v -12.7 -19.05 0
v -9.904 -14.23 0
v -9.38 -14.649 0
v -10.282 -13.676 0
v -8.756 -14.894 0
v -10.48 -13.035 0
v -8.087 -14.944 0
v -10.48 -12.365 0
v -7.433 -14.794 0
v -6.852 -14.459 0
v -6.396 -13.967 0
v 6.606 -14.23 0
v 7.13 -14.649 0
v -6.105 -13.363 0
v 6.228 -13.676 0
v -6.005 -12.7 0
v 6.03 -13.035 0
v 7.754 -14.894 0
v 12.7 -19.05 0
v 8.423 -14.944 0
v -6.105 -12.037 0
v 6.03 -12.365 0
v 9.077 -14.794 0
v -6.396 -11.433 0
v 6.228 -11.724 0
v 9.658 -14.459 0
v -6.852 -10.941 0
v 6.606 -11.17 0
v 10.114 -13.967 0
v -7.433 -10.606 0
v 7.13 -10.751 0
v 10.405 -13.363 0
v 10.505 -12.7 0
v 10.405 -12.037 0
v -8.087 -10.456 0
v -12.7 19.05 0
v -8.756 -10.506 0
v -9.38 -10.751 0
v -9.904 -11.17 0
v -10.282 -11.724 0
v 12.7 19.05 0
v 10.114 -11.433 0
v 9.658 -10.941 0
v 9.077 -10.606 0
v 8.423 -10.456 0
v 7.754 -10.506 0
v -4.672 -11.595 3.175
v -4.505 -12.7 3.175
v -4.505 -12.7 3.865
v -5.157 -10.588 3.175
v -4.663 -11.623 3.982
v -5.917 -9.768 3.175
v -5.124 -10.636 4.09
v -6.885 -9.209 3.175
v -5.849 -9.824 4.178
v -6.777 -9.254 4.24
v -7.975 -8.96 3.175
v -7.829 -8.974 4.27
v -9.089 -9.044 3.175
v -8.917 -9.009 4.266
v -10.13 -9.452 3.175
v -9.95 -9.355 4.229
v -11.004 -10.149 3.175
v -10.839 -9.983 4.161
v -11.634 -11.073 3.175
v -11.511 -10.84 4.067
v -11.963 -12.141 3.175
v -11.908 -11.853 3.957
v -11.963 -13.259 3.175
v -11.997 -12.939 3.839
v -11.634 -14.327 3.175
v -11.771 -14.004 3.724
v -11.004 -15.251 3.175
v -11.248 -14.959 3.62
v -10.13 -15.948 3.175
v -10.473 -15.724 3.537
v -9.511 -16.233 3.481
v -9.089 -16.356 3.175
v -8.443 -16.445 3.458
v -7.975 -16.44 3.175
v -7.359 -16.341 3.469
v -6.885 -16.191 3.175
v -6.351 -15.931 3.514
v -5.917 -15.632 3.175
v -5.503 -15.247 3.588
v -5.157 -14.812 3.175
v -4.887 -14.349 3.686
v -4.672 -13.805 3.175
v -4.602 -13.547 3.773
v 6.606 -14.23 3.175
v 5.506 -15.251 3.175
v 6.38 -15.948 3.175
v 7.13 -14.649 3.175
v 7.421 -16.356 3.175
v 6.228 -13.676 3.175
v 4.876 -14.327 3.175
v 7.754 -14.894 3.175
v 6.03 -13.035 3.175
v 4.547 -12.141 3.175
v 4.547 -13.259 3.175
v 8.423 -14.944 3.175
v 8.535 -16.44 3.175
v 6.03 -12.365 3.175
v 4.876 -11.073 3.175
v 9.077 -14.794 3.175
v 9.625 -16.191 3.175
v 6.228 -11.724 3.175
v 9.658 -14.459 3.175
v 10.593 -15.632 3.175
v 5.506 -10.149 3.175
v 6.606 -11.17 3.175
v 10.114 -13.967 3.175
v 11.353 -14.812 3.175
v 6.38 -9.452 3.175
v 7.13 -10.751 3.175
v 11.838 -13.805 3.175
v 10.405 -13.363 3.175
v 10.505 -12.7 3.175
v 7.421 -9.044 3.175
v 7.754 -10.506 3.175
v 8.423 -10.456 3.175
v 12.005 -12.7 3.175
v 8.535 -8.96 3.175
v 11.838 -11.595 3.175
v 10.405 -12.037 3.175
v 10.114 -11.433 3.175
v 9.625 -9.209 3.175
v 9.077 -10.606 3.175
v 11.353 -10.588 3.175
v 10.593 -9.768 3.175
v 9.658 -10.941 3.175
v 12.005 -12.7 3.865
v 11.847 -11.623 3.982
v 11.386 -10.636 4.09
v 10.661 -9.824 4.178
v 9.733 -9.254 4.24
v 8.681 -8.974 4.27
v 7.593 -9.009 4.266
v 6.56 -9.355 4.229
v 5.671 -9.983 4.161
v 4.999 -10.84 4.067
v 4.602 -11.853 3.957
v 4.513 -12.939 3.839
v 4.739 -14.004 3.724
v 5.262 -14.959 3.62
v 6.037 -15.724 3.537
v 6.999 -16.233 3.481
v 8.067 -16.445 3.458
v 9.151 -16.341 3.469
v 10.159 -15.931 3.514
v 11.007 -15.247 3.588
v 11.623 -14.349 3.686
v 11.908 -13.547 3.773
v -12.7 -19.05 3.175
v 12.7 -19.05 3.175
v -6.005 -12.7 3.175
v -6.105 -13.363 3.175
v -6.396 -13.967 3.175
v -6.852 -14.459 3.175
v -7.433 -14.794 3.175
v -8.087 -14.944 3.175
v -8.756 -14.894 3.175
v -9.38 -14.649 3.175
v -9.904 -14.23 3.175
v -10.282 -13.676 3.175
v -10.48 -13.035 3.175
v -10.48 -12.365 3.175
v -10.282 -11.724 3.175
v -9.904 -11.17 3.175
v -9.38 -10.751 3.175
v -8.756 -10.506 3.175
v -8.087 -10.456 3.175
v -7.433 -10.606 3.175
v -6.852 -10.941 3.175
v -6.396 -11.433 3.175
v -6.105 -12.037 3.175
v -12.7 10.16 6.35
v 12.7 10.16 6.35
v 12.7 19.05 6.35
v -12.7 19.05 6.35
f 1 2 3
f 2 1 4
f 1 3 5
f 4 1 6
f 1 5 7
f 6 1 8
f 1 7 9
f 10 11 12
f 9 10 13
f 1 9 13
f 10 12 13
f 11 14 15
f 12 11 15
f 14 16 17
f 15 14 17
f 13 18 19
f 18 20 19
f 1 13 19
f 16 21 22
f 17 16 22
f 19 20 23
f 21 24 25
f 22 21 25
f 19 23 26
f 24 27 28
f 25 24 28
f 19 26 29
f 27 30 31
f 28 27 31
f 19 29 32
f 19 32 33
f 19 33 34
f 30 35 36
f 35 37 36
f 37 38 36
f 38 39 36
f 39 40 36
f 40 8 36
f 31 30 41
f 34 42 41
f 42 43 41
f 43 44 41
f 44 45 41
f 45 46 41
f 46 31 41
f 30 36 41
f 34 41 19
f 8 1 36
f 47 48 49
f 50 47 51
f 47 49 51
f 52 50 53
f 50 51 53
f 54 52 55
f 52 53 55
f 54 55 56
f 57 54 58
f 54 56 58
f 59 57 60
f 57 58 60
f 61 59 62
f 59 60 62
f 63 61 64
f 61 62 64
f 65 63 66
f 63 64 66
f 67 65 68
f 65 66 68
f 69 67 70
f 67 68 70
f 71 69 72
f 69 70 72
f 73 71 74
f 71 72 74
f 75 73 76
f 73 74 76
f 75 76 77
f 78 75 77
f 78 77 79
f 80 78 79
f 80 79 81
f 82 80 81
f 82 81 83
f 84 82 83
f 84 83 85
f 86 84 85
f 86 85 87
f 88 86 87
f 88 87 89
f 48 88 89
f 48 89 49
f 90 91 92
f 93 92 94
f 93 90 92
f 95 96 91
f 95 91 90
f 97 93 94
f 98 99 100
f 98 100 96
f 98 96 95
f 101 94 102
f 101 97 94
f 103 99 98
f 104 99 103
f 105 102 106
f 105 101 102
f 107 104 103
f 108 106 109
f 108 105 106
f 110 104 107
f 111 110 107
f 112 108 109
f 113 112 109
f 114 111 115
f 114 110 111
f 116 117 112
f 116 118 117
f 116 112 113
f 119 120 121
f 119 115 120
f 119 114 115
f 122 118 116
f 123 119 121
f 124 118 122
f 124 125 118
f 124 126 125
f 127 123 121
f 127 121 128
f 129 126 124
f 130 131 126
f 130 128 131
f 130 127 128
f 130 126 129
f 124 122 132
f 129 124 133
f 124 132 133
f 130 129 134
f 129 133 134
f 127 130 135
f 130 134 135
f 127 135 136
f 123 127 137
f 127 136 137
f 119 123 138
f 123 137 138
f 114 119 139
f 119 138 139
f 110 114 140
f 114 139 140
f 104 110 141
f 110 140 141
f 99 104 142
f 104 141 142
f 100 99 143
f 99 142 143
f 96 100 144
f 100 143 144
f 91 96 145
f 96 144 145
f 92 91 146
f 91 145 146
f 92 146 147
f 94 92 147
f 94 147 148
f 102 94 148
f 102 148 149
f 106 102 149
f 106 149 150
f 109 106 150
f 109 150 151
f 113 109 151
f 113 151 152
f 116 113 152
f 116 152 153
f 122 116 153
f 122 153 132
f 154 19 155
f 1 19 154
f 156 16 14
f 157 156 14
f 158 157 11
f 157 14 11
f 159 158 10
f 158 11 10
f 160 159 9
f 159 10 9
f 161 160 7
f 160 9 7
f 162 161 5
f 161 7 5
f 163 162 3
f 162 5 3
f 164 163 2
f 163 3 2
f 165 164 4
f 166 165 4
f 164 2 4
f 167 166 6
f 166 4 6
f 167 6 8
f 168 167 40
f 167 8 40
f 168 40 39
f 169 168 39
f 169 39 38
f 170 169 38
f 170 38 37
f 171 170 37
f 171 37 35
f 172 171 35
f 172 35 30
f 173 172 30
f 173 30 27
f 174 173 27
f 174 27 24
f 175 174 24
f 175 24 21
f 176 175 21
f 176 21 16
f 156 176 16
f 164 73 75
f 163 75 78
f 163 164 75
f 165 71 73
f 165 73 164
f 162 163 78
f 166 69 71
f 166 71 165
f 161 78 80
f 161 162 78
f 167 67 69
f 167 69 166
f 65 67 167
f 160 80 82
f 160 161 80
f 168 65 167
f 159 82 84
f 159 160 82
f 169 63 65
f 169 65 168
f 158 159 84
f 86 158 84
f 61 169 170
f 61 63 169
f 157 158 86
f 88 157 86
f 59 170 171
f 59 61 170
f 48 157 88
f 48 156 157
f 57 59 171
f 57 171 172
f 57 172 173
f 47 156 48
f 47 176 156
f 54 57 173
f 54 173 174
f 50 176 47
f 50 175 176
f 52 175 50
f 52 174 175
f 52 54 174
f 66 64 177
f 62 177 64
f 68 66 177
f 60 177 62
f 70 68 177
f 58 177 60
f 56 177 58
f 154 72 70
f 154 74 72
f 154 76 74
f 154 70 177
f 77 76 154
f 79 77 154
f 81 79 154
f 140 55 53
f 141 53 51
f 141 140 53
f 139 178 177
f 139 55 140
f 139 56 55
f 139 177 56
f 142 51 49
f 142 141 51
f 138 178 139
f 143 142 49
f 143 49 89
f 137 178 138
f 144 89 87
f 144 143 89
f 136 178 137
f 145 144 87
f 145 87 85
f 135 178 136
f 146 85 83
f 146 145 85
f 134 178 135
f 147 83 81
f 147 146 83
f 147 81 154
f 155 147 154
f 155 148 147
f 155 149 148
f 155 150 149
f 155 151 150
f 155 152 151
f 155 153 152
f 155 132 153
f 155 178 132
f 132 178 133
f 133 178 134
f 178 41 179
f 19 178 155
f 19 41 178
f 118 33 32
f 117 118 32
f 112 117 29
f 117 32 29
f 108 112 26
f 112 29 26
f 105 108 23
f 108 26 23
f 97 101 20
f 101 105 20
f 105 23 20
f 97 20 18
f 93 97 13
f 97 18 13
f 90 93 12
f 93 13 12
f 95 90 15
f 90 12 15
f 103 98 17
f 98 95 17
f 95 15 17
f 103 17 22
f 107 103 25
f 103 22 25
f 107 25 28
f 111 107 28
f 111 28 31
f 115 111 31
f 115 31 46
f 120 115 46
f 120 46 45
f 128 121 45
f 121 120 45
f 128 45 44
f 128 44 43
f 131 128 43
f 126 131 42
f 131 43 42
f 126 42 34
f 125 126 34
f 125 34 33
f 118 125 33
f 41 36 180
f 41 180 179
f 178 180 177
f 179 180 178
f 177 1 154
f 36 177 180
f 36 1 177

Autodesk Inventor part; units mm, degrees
ref_plane "YZ Plane" through (0, 0, 0) normal (1, 0, 0) x (0, 1, 0)
ref_plane "XZ Plane" through (0, 0, 0) normal (0, 1, 0) x (-1, 0, 0)
sketch "Sketch1" plane through (0, 0, 0) normal (0, 0, 1) x (1, 0, 0)
  line L0 (12.7, -19.05) -> (-12.7, -19.05)
  line L1 (-12.7, -19.05) -> (-12.7, 19.05)
  line L2 (-12.7, 19.05) -> (12.7, 19.05)
  line L3 (12.7, 19.05) -> (12.7, -19.05)
  line L4 (12.7, -19.05) -> (-12.7, 19.05) construction
  line L5 (-12.7, -19.05) -> (12.7, 19.05) construction
  circle A0 centre (-8.255, -12.7) radius 2.25
  circle A1 centre (8.255, -12.7) radius 2.25
  line L6 (0, 19.05) -> (0, -19.05) construction
  line L7 (-6.005, 19.05) -> (-6.005, -19.05) construction
  line L8 (6.005, 19.05) -> (6.005, -19.05) construction
  line L9 (-6.005, 19.05) -> (2.4874, 19.05) construction
  circle A2 centre (-8.255, -12.7) radius 3.75
  circle A3 centre (8.255, -12.7) radius 3.75
  point P0 (0, 0)
  point P1 (0, 13.045)
  dimension "d0" = 25.4
  dimension "d1" = 38.1
  dimension "d2" = 4.5
  dimension "d3" = 4.5
  dimension "d4" = 8.255
  dimension "d5" = 8.255
  dimension "d6" = 6.35
  dimension "d7" = 6.35
  dimension "d14" = 7.5
  dimension "d15" = 7.5
extrude "Extrusion1" add sketch "Sketch1" along normal blind 6.35 contours L0 L1 L2 L3 | A2 | A3
sketch "Sketch2" plane through (12.7, -19.05, 0) normal (1, 0, 0) x (0, 0, -1)
  line L0 (-6.35, 32.095) -> (-6.35, 38.1) projected
  line L1 (0, 38.1) -> (0, 0) projected
  line L2 (-6.35, 38.1) -> (0, 38.1)
  line L3 (0, 38.1) -> (0, 29.21)
  line L4 (0, 29.21) -> (-6.35, 29.21)
  line L5 (-6.35, 29.21) -> (-6.35, 38.1)
  line L6 (-6.35, 29.21) -> (-3.175, 0)
  line L7 (0, 0) -> (-6.35, 0) projected
  line L8 (-3.175, 0) -> (0, 0)
  line L9 (-6.35, 4.1) -> (0, 4.1) projected
  line L10 (0, 0) -> (0, 38.1) projected
  line L11 (0, 38.1) -> (-6.35, 38.1) projected
  line L12 (-6.35, 0) -> (-6.35, 38.1) projected
  line L13 (0, 0) -> (-6.35, 0) projected
  point P0 (0, 19.05)
  dimension "d11" = 8.89
extrude "Extrusion2" cut sketch "Sketch2" against normal through all contours L6 L9 L12 | L6 L7 L12 L9
ref_plane "Work Plane1" through (12.7, 14.605, 6.35) normal (0, 0, 1) x (1, 0, 0)
sketch "Sketch3" plane through (12.7, 14.605, 6.35) normal (0, 0, 1) x (1, 0, 0)
  line L0 (-25.4, -33.655) -> (-25.4, -4.445) projected
  line L1 (0, -33.655) -> (-25.4, -33.655) projected
  line L2 (0, -4.445) -> (0, -33.655) projected
  line L3 (-25.4, -4.445) -> (0, -4.445) projected
  circle A0 centre (-4.445, -27.305) radius 2.25 projected
  circle A1 centre (-20.955, -27.305) radius 2.25 projected
  circle A2 centre (-20.955, -27.305) radius 2.25 projected
  circle A3 centre (-20.955, -27.305) radius 3.75
  circle A4 centre (-4.445, -27.305) radius 3.75
  point P0 (-12.7, -14.605)
  dimension "d16" = 7.5
  dimension "d17" = 7.5
extrude "Extrusion3" cut sketch "Sketch3" against normal blind 3.175 contours A1 | A3 | A4
properties part number "Drone_Launcher_Stopper"
